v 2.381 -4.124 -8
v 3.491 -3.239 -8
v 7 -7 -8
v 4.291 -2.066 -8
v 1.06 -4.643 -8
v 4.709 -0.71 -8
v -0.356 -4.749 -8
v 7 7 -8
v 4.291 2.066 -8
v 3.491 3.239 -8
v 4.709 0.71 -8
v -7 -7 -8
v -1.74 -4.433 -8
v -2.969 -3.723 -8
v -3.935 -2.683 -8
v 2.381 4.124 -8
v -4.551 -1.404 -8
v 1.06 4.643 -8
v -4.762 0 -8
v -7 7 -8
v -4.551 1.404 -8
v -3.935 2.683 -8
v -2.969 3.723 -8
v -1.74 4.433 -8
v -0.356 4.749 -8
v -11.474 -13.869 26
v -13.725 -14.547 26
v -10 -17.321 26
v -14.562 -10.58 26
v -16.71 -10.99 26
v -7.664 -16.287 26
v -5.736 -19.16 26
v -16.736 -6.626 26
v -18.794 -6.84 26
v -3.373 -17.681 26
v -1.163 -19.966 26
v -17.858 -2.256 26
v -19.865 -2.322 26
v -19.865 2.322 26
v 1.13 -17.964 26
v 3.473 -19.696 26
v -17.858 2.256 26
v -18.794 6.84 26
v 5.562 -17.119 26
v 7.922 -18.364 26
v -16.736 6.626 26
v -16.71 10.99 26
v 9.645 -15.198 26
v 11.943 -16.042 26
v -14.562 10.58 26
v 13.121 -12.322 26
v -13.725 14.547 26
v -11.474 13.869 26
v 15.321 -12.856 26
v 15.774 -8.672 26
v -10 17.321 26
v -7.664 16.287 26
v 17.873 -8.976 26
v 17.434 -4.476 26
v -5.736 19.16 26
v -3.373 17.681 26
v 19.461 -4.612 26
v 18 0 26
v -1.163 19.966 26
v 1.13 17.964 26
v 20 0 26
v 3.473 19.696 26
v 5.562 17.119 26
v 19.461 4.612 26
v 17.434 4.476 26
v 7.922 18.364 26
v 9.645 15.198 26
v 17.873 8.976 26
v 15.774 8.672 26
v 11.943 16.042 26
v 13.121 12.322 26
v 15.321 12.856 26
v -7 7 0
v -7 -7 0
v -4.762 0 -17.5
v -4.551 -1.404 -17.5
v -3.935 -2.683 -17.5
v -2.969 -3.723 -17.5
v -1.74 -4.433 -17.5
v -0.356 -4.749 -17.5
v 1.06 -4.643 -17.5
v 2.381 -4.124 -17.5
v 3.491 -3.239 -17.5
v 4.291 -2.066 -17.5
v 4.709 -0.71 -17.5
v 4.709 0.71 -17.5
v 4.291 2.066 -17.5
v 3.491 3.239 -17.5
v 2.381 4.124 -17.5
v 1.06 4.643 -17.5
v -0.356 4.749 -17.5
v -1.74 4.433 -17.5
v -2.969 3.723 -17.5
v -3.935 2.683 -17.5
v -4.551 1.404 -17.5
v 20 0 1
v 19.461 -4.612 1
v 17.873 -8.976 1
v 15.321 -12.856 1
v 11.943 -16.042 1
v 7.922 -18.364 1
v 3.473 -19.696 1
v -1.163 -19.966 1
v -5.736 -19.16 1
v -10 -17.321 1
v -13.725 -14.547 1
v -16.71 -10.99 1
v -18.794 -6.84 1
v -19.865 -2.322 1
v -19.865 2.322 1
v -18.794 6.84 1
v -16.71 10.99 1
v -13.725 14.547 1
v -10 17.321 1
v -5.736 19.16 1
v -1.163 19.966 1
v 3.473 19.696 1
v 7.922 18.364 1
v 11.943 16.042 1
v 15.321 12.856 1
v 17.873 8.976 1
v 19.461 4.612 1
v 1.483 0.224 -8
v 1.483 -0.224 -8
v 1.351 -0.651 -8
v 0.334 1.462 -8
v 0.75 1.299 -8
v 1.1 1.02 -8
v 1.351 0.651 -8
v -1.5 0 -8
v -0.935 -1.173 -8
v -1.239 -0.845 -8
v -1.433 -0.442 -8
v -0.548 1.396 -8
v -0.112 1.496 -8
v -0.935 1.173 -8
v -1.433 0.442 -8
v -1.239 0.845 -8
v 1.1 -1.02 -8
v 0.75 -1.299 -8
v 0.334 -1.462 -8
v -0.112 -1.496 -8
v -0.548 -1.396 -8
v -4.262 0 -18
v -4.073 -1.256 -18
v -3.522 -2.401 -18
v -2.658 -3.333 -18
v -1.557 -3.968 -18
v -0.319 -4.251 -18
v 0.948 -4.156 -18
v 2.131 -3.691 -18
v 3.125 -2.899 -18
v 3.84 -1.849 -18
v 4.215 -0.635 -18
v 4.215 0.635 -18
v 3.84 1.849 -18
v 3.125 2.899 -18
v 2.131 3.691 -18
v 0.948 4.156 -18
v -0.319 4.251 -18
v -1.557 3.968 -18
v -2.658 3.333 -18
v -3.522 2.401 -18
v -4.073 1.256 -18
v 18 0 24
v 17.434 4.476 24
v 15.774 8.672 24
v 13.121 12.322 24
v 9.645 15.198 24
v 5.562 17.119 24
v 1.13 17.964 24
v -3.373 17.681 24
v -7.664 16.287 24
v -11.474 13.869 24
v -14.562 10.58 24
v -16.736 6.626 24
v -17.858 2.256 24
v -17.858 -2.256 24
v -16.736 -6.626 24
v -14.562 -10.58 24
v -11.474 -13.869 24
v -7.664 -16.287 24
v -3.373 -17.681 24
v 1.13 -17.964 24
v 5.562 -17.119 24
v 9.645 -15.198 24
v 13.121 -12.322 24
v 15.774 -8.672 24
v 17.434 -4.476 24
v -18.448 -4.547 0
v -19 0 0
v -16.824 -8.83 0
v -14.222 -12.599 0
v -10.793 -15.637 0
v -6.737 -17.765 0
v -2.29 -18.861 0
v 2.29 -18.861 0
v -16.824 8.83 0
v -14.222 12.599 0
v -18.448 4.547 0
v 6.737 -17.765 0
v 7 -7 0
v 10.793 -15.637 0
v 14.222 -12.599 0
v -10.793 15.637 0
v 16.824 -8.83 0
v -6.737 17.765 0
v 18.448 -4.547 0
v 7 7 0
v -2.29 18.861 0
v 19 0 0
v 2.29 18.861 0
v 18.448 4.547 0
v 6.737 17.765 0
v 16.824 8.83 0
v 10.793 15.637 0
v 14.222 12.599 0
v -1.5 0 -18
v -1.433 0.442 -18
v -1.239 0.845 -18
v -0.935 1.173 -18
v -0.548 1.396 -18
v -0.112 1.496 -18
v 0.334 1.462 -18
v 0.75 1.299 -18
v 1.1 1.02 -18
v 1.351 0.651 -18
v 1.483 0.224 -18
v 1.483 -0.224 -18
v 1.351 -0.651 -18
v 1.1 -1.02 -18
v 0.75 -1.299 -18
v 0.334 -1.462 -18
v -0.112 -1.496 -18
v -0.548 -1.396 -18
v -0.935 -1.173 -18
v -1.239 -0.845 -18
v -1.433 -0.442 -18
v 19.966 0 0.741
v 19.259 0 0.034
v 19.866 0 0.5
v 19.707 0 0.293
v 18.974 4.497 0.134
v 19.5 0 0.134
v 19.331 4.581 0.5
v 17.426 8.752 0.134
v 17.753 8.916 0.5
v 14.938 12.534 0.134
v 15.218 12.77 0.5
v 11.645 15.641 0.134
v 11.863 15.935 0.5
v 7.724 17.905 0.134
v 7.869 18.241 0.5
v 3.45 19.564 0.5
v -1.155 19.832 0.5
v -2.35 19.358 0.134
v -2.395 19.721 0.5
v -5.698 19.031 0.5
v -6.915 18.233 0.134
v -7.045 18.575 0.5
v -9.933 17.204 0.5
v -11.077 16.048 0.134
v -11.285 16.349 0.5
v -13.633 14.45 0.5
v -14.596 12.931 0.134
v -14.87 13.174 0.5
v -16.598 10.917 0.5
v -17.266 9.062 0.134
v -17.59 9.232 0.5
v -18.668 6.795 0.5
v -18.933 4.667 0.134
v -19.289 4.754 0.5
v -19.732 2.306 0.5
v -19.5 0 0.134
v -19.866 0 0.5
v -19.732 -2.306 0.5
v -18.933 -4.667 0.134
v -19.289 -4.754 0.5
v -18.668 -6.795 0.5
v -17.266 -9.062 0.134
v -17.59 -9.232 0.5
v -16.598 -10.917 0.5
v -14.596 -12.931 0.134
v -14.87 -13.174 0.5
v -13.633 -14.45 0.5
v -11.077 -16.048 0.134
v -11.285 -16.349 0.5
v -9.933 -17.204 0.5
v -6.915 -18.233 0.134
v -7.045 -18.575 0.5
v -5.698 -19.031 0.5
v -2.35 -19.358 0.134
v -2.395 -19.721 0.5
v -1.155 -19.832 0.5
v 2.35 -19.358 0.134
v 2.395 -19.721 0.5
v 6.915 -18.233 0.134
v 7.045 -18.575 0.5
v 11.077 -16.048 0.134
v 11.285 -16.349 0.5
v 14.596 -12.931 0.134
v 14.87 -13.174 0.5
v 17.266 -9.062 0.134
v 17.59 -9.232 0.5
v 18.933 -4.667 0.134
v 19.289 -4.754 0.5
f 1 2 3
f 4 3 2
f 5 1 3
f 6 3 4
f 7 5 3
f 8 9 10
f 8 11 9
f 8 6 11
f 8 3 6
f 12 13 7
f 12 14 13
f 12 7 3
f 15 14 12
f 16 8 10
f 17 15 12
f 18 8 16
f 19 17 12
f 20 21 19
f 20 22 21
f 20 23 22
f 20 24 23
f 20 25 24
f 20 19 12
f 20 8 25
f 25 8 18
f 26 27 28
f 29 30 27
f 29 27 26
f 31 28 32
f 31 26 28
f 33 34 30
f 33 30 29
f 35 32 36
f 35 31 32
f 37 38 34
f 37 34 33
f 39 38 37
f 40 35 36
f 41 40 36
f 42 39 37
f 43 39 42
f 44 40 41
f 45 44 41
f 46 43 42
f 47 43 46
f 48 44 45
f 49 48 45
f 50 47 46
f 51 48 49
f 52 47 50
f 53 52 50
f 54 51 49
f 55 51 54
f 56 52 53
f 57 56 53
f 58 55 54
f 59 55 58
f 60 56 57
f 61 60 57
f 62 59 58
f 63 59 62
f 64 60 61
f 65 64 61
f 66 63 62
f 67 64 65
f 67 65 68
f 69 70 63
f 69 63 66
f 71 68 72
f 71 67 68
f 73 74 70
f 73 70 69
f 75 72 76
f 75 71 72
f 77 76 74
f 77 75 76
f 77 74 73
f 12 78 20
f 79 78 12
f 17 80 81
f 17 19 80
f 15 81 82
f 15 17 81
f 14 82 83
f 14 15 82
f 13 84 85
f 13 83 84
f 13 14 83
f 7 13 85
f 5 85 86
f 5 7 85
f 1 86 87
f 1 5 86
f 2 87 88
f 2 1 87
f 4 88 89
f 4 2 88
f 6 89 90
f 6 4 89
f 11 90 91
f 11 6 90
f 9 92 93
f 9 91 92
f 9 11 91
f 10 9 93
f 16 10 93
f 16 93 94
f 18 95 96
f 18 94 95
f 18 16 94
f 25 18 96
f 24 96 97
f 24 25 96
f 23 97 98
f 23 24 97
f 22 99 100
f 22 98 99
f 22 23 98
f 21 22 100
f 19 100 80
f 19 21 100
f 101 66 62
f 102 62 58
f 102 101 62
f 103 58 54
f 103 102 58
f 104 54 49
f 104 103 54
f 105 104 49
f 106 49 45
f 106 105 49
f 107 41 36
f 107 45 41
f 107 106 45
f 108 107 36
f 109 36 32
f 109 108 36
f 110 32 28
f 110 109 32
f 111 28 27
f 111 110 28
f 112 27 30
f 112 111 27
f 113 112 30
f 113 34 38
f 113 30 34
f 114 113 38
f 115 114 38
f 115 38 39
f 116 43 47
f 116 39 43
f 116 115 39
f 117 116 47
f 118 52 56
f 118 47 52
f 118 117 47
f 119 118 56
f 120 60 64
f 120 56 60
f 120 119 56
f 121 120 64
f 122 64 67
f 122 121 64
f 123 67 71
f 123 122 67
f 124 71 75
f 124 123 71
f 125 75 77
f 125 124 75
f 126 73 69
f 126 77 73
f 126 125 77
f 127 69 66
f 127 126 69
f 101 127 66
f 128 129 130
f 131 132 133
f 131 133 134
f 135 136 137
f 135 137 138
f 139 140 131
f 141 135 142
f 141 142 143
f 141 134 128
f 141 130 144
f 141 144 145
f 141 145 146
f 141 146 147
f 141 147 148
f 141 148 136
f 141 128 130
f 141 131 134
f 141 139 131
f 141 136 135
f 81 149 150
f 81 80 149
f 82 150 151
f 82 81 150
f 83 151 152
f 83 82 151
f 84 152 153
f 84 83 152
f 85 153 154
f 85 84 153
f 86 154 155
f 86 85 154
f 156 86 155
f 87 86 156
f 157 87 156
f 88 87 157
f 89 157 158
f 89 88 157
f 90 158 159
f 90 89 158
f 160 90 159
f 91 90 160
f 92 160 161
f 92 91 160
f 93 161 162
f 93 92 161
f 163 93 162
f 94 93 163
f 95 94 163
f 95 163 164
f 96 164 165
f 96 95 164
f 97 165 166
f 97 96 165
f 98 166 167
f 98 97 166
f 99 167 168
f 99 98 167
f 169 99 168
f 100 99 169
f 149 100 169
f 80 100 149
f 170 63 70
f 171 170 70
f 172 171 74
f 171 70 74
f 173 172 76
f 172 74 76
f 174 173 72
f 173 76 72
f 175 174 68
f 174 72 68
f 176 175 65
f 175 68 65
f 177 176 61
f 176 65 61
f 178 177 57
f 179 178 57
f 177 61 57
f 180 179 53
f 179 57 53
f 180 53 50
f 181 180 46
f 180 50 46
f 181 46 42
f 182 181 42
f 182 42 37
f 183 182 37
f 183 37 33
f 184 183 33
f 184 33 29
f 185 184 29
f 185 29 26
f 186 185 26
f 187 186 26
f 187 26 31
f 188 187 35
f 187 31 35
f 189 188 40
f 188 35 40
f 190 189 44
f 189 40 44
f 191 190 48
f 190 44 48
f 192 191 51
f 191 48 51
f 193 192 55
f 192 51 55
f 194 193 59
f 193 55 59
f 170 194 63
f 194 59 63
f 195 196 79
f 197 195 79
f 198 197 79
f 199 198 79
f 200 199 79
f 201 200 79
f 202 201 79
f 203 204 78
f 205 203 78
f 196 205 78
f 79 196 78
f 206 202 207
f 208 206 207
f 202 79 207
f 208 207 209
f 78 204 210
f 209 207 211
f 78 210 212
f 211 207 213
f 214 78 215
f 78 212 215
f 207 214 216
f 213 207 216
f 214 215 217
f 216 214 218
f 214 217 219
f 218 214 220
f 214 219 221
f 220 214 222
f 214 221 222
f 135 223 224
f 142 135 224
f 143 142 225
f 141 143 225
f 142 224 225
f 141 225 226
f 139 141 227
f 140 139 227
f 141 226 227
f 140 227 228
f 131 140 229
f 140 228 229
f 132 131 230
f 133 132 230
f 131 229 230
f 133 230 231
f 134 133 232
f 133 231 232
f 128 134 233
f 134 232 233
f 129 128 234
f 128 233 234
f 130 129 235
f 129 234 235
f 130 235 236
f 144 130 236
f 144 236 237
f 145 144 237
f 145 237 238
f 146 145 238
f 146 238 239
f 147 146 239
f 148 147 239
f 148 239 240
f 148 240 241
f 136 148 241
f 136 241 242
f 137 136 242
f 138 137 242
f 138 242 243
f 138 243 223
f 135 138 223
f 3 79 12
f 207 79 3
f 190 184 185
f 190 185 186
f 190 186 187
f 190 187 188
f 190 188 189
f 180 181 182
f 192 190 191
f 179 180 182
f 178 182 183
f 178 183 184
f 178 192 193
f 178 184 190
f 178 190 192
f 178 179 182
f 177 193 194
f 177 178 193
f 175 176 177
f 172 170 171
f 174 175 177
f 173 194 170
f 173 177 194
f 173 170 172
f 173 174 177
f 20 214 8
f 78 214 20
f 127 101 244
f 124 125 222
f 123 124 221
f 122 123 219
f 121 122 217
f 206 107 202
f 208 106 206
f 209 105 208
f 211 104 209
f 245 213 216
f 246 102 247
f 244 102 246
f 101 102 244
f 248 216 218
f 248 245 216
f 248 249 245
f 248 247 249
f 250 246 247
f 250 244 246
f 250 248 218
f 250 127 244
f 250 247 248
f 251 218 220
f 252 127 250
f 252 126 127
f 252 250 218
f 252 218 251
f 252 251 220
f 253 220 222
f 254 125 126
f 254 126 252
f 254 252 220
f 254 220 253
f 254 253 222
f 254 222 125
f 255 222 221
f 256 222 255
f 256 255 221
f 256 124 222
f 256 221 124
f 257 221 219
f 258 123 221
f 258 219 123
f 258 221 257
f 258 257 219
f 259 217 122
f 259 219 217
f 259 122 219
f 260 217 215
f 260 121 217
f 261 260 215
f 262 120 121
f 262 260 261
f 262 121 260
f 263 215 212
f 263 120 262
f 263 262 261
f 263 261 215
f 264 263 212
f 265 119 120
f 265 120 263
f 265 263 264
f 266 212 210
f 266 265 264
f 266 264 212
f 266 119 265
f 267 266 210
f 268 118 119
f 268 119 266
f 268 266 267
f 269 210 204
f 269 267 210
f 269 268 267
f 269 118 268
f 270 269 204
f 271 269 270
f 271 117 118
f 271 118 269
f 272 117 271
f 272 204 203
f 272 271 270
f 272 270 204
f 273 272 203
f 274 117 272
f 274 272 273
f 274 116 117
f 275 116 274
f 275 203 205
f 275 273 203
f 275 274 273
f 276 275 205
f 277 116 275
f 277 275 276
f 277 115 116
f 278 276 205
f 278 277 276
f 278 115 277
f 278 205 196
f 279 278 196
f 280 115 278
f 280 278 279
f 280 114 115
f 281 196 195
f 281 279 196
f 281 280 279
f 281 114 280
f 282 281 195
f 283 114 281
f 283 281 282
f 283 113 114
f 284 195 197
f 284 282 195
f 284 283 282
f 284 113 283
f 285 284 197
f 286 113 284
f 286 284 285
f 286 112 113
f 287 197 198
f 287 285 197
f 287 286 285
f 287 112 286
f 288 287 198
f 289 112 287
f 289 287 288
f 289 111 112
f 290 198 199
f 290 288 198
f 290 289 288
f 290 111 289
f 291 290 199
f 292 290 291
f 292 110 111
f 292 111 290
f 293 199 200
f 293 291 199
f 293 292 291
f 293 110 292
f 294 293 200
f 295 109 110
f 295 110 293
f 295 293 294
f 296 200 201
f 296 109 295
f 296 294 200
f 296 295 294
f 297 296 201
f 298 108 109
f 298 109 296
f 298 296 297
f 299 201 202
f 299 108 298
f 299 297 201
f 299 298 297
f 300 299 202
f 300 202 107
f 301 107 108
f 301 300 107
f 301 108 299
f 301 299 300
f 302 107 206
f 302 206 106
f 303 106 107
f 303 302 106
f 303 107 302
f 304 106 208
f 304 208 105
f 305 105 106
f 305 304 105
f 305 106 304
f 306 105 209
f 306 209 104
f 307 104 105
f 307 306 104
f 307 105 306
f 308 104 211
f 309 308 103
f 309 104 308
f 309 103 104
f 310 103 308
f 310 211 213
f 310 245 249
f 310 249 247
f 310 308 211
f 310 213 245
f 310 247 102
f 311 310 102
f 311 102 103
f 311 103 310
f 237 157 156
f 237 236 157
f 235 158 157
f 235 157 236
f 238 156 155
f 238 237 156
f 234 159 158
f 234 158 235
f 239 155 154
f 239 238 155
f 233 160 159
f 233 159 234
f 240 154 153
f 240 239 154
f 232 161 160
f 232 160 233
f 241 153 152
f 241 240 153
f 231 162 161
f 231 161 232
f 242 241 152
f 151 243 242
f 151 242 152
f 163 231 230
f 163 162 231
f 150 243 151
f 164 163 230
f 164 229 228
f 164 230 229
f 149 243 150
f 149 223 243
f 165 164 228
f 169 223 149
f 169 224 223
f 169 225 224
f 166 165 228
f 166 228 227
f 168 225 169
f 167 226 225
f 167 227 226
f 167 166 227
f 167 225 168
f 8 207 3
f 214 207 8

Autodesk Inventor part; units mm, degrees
ref_plane "YZ Plane" through (0, 0, 0) normal (1, 0, 0) x (0, 1, 0)
ref_plane "XZ Plane" through (0, 0, 0) normal (0, 1, 0) x (-1, 0, 0)
ref_plane "XY Plane" through (0, 0, 0) normal (0, 0, 1) x (1, 0, 0)
sketch "Sketch13" plane through (0, 0, 0) normal (0, 0, 1) x (1, 0, 0)
  circle A0 centre (0, 0) radius 20
  dimension "d46" = 40
extrude "Extrusion13" add sketch "Sketch13" along normal blind 26
sketch "Sketch15" plane through (0, 0, 0) normal (0, 0, -1) x (-1, 0, 0)
  line L0 (-7, 7) -> (7, 7)
  line L1 (7, 7) -> (7, -7)
  line L2 (7, -7) -> (-7, -7)
  line L3 (-7, -7) -> (-7, 7)
  line L4 (-28, 0) -> (28, 0) projected
  line L5 (0, -28) -> (0, 28) projected
  dimension "d52" = 14
  dimension "d53" = 14
extrude "Extrusion15" add sketch "Sketch15" along normal blind 8
sketch "Sketch16" plane through (0, 0, -8) normal (0, 0, -1) x (-1, 0, 0)
  circle A0 centre (0, 0) radius 4.7625
  dimension "d58" = 9.525
extrude "Extrusion16" add sketch "Sketch16" along normal blind 10
thread "Thread3" size "1/8" designation "1/8 - 27 NPT" standard "NPT" full length
sketch "Sketch18" plane through (0, 0, 26) normal (0, 0, 1) x (1, 0, 0)
  circle A0 centre (0, 0) radius 20 projected
  circle A1 centre (0, 0) radius 18
  dimension "d66" = 2
extrude "Extrusion18" cut sketch "Sketch18" against normal blind 2 contours A1
sketch "Sketch20" plane through (0, 0, -18) normal (0, 0, -1) x (-1, 0, 0)
  circle A0 centre (0, 0) radius 4.7625 projected
  circle A1 centre (0, 0) radius 1.5
  dimension "d75" = 3
extrude "Extrusion19" cut sketch "Sketch20" against normal blind 10 contours A1
sketch "Sketch19" plane through (0, 0, 24) normal (0, 0, 1) x (1, 0, 0)
  circle A0 centre (0, 0) radius 18 projected
  line L0 (-6.3869, -6.5985) -> (5.7442, -6.5985) construction
  line L1 (5.7442, -6.5985) -> (5.7442, -16.6783) construction
  line L2 (5.7442, -16.6783) -> (-6.3869, -16.6783) construction
  line L3 (-6.3869, -16.6783) -> (-6.3869, -6.5985) construction
chamfer "Chamfer1" distance 0.5 angle 45 1 edges at (4.7625, 0, -18)
fillet "Fillet5" radius 1 1 edges at (-20, 0, 0)
properties part number "9690242"
